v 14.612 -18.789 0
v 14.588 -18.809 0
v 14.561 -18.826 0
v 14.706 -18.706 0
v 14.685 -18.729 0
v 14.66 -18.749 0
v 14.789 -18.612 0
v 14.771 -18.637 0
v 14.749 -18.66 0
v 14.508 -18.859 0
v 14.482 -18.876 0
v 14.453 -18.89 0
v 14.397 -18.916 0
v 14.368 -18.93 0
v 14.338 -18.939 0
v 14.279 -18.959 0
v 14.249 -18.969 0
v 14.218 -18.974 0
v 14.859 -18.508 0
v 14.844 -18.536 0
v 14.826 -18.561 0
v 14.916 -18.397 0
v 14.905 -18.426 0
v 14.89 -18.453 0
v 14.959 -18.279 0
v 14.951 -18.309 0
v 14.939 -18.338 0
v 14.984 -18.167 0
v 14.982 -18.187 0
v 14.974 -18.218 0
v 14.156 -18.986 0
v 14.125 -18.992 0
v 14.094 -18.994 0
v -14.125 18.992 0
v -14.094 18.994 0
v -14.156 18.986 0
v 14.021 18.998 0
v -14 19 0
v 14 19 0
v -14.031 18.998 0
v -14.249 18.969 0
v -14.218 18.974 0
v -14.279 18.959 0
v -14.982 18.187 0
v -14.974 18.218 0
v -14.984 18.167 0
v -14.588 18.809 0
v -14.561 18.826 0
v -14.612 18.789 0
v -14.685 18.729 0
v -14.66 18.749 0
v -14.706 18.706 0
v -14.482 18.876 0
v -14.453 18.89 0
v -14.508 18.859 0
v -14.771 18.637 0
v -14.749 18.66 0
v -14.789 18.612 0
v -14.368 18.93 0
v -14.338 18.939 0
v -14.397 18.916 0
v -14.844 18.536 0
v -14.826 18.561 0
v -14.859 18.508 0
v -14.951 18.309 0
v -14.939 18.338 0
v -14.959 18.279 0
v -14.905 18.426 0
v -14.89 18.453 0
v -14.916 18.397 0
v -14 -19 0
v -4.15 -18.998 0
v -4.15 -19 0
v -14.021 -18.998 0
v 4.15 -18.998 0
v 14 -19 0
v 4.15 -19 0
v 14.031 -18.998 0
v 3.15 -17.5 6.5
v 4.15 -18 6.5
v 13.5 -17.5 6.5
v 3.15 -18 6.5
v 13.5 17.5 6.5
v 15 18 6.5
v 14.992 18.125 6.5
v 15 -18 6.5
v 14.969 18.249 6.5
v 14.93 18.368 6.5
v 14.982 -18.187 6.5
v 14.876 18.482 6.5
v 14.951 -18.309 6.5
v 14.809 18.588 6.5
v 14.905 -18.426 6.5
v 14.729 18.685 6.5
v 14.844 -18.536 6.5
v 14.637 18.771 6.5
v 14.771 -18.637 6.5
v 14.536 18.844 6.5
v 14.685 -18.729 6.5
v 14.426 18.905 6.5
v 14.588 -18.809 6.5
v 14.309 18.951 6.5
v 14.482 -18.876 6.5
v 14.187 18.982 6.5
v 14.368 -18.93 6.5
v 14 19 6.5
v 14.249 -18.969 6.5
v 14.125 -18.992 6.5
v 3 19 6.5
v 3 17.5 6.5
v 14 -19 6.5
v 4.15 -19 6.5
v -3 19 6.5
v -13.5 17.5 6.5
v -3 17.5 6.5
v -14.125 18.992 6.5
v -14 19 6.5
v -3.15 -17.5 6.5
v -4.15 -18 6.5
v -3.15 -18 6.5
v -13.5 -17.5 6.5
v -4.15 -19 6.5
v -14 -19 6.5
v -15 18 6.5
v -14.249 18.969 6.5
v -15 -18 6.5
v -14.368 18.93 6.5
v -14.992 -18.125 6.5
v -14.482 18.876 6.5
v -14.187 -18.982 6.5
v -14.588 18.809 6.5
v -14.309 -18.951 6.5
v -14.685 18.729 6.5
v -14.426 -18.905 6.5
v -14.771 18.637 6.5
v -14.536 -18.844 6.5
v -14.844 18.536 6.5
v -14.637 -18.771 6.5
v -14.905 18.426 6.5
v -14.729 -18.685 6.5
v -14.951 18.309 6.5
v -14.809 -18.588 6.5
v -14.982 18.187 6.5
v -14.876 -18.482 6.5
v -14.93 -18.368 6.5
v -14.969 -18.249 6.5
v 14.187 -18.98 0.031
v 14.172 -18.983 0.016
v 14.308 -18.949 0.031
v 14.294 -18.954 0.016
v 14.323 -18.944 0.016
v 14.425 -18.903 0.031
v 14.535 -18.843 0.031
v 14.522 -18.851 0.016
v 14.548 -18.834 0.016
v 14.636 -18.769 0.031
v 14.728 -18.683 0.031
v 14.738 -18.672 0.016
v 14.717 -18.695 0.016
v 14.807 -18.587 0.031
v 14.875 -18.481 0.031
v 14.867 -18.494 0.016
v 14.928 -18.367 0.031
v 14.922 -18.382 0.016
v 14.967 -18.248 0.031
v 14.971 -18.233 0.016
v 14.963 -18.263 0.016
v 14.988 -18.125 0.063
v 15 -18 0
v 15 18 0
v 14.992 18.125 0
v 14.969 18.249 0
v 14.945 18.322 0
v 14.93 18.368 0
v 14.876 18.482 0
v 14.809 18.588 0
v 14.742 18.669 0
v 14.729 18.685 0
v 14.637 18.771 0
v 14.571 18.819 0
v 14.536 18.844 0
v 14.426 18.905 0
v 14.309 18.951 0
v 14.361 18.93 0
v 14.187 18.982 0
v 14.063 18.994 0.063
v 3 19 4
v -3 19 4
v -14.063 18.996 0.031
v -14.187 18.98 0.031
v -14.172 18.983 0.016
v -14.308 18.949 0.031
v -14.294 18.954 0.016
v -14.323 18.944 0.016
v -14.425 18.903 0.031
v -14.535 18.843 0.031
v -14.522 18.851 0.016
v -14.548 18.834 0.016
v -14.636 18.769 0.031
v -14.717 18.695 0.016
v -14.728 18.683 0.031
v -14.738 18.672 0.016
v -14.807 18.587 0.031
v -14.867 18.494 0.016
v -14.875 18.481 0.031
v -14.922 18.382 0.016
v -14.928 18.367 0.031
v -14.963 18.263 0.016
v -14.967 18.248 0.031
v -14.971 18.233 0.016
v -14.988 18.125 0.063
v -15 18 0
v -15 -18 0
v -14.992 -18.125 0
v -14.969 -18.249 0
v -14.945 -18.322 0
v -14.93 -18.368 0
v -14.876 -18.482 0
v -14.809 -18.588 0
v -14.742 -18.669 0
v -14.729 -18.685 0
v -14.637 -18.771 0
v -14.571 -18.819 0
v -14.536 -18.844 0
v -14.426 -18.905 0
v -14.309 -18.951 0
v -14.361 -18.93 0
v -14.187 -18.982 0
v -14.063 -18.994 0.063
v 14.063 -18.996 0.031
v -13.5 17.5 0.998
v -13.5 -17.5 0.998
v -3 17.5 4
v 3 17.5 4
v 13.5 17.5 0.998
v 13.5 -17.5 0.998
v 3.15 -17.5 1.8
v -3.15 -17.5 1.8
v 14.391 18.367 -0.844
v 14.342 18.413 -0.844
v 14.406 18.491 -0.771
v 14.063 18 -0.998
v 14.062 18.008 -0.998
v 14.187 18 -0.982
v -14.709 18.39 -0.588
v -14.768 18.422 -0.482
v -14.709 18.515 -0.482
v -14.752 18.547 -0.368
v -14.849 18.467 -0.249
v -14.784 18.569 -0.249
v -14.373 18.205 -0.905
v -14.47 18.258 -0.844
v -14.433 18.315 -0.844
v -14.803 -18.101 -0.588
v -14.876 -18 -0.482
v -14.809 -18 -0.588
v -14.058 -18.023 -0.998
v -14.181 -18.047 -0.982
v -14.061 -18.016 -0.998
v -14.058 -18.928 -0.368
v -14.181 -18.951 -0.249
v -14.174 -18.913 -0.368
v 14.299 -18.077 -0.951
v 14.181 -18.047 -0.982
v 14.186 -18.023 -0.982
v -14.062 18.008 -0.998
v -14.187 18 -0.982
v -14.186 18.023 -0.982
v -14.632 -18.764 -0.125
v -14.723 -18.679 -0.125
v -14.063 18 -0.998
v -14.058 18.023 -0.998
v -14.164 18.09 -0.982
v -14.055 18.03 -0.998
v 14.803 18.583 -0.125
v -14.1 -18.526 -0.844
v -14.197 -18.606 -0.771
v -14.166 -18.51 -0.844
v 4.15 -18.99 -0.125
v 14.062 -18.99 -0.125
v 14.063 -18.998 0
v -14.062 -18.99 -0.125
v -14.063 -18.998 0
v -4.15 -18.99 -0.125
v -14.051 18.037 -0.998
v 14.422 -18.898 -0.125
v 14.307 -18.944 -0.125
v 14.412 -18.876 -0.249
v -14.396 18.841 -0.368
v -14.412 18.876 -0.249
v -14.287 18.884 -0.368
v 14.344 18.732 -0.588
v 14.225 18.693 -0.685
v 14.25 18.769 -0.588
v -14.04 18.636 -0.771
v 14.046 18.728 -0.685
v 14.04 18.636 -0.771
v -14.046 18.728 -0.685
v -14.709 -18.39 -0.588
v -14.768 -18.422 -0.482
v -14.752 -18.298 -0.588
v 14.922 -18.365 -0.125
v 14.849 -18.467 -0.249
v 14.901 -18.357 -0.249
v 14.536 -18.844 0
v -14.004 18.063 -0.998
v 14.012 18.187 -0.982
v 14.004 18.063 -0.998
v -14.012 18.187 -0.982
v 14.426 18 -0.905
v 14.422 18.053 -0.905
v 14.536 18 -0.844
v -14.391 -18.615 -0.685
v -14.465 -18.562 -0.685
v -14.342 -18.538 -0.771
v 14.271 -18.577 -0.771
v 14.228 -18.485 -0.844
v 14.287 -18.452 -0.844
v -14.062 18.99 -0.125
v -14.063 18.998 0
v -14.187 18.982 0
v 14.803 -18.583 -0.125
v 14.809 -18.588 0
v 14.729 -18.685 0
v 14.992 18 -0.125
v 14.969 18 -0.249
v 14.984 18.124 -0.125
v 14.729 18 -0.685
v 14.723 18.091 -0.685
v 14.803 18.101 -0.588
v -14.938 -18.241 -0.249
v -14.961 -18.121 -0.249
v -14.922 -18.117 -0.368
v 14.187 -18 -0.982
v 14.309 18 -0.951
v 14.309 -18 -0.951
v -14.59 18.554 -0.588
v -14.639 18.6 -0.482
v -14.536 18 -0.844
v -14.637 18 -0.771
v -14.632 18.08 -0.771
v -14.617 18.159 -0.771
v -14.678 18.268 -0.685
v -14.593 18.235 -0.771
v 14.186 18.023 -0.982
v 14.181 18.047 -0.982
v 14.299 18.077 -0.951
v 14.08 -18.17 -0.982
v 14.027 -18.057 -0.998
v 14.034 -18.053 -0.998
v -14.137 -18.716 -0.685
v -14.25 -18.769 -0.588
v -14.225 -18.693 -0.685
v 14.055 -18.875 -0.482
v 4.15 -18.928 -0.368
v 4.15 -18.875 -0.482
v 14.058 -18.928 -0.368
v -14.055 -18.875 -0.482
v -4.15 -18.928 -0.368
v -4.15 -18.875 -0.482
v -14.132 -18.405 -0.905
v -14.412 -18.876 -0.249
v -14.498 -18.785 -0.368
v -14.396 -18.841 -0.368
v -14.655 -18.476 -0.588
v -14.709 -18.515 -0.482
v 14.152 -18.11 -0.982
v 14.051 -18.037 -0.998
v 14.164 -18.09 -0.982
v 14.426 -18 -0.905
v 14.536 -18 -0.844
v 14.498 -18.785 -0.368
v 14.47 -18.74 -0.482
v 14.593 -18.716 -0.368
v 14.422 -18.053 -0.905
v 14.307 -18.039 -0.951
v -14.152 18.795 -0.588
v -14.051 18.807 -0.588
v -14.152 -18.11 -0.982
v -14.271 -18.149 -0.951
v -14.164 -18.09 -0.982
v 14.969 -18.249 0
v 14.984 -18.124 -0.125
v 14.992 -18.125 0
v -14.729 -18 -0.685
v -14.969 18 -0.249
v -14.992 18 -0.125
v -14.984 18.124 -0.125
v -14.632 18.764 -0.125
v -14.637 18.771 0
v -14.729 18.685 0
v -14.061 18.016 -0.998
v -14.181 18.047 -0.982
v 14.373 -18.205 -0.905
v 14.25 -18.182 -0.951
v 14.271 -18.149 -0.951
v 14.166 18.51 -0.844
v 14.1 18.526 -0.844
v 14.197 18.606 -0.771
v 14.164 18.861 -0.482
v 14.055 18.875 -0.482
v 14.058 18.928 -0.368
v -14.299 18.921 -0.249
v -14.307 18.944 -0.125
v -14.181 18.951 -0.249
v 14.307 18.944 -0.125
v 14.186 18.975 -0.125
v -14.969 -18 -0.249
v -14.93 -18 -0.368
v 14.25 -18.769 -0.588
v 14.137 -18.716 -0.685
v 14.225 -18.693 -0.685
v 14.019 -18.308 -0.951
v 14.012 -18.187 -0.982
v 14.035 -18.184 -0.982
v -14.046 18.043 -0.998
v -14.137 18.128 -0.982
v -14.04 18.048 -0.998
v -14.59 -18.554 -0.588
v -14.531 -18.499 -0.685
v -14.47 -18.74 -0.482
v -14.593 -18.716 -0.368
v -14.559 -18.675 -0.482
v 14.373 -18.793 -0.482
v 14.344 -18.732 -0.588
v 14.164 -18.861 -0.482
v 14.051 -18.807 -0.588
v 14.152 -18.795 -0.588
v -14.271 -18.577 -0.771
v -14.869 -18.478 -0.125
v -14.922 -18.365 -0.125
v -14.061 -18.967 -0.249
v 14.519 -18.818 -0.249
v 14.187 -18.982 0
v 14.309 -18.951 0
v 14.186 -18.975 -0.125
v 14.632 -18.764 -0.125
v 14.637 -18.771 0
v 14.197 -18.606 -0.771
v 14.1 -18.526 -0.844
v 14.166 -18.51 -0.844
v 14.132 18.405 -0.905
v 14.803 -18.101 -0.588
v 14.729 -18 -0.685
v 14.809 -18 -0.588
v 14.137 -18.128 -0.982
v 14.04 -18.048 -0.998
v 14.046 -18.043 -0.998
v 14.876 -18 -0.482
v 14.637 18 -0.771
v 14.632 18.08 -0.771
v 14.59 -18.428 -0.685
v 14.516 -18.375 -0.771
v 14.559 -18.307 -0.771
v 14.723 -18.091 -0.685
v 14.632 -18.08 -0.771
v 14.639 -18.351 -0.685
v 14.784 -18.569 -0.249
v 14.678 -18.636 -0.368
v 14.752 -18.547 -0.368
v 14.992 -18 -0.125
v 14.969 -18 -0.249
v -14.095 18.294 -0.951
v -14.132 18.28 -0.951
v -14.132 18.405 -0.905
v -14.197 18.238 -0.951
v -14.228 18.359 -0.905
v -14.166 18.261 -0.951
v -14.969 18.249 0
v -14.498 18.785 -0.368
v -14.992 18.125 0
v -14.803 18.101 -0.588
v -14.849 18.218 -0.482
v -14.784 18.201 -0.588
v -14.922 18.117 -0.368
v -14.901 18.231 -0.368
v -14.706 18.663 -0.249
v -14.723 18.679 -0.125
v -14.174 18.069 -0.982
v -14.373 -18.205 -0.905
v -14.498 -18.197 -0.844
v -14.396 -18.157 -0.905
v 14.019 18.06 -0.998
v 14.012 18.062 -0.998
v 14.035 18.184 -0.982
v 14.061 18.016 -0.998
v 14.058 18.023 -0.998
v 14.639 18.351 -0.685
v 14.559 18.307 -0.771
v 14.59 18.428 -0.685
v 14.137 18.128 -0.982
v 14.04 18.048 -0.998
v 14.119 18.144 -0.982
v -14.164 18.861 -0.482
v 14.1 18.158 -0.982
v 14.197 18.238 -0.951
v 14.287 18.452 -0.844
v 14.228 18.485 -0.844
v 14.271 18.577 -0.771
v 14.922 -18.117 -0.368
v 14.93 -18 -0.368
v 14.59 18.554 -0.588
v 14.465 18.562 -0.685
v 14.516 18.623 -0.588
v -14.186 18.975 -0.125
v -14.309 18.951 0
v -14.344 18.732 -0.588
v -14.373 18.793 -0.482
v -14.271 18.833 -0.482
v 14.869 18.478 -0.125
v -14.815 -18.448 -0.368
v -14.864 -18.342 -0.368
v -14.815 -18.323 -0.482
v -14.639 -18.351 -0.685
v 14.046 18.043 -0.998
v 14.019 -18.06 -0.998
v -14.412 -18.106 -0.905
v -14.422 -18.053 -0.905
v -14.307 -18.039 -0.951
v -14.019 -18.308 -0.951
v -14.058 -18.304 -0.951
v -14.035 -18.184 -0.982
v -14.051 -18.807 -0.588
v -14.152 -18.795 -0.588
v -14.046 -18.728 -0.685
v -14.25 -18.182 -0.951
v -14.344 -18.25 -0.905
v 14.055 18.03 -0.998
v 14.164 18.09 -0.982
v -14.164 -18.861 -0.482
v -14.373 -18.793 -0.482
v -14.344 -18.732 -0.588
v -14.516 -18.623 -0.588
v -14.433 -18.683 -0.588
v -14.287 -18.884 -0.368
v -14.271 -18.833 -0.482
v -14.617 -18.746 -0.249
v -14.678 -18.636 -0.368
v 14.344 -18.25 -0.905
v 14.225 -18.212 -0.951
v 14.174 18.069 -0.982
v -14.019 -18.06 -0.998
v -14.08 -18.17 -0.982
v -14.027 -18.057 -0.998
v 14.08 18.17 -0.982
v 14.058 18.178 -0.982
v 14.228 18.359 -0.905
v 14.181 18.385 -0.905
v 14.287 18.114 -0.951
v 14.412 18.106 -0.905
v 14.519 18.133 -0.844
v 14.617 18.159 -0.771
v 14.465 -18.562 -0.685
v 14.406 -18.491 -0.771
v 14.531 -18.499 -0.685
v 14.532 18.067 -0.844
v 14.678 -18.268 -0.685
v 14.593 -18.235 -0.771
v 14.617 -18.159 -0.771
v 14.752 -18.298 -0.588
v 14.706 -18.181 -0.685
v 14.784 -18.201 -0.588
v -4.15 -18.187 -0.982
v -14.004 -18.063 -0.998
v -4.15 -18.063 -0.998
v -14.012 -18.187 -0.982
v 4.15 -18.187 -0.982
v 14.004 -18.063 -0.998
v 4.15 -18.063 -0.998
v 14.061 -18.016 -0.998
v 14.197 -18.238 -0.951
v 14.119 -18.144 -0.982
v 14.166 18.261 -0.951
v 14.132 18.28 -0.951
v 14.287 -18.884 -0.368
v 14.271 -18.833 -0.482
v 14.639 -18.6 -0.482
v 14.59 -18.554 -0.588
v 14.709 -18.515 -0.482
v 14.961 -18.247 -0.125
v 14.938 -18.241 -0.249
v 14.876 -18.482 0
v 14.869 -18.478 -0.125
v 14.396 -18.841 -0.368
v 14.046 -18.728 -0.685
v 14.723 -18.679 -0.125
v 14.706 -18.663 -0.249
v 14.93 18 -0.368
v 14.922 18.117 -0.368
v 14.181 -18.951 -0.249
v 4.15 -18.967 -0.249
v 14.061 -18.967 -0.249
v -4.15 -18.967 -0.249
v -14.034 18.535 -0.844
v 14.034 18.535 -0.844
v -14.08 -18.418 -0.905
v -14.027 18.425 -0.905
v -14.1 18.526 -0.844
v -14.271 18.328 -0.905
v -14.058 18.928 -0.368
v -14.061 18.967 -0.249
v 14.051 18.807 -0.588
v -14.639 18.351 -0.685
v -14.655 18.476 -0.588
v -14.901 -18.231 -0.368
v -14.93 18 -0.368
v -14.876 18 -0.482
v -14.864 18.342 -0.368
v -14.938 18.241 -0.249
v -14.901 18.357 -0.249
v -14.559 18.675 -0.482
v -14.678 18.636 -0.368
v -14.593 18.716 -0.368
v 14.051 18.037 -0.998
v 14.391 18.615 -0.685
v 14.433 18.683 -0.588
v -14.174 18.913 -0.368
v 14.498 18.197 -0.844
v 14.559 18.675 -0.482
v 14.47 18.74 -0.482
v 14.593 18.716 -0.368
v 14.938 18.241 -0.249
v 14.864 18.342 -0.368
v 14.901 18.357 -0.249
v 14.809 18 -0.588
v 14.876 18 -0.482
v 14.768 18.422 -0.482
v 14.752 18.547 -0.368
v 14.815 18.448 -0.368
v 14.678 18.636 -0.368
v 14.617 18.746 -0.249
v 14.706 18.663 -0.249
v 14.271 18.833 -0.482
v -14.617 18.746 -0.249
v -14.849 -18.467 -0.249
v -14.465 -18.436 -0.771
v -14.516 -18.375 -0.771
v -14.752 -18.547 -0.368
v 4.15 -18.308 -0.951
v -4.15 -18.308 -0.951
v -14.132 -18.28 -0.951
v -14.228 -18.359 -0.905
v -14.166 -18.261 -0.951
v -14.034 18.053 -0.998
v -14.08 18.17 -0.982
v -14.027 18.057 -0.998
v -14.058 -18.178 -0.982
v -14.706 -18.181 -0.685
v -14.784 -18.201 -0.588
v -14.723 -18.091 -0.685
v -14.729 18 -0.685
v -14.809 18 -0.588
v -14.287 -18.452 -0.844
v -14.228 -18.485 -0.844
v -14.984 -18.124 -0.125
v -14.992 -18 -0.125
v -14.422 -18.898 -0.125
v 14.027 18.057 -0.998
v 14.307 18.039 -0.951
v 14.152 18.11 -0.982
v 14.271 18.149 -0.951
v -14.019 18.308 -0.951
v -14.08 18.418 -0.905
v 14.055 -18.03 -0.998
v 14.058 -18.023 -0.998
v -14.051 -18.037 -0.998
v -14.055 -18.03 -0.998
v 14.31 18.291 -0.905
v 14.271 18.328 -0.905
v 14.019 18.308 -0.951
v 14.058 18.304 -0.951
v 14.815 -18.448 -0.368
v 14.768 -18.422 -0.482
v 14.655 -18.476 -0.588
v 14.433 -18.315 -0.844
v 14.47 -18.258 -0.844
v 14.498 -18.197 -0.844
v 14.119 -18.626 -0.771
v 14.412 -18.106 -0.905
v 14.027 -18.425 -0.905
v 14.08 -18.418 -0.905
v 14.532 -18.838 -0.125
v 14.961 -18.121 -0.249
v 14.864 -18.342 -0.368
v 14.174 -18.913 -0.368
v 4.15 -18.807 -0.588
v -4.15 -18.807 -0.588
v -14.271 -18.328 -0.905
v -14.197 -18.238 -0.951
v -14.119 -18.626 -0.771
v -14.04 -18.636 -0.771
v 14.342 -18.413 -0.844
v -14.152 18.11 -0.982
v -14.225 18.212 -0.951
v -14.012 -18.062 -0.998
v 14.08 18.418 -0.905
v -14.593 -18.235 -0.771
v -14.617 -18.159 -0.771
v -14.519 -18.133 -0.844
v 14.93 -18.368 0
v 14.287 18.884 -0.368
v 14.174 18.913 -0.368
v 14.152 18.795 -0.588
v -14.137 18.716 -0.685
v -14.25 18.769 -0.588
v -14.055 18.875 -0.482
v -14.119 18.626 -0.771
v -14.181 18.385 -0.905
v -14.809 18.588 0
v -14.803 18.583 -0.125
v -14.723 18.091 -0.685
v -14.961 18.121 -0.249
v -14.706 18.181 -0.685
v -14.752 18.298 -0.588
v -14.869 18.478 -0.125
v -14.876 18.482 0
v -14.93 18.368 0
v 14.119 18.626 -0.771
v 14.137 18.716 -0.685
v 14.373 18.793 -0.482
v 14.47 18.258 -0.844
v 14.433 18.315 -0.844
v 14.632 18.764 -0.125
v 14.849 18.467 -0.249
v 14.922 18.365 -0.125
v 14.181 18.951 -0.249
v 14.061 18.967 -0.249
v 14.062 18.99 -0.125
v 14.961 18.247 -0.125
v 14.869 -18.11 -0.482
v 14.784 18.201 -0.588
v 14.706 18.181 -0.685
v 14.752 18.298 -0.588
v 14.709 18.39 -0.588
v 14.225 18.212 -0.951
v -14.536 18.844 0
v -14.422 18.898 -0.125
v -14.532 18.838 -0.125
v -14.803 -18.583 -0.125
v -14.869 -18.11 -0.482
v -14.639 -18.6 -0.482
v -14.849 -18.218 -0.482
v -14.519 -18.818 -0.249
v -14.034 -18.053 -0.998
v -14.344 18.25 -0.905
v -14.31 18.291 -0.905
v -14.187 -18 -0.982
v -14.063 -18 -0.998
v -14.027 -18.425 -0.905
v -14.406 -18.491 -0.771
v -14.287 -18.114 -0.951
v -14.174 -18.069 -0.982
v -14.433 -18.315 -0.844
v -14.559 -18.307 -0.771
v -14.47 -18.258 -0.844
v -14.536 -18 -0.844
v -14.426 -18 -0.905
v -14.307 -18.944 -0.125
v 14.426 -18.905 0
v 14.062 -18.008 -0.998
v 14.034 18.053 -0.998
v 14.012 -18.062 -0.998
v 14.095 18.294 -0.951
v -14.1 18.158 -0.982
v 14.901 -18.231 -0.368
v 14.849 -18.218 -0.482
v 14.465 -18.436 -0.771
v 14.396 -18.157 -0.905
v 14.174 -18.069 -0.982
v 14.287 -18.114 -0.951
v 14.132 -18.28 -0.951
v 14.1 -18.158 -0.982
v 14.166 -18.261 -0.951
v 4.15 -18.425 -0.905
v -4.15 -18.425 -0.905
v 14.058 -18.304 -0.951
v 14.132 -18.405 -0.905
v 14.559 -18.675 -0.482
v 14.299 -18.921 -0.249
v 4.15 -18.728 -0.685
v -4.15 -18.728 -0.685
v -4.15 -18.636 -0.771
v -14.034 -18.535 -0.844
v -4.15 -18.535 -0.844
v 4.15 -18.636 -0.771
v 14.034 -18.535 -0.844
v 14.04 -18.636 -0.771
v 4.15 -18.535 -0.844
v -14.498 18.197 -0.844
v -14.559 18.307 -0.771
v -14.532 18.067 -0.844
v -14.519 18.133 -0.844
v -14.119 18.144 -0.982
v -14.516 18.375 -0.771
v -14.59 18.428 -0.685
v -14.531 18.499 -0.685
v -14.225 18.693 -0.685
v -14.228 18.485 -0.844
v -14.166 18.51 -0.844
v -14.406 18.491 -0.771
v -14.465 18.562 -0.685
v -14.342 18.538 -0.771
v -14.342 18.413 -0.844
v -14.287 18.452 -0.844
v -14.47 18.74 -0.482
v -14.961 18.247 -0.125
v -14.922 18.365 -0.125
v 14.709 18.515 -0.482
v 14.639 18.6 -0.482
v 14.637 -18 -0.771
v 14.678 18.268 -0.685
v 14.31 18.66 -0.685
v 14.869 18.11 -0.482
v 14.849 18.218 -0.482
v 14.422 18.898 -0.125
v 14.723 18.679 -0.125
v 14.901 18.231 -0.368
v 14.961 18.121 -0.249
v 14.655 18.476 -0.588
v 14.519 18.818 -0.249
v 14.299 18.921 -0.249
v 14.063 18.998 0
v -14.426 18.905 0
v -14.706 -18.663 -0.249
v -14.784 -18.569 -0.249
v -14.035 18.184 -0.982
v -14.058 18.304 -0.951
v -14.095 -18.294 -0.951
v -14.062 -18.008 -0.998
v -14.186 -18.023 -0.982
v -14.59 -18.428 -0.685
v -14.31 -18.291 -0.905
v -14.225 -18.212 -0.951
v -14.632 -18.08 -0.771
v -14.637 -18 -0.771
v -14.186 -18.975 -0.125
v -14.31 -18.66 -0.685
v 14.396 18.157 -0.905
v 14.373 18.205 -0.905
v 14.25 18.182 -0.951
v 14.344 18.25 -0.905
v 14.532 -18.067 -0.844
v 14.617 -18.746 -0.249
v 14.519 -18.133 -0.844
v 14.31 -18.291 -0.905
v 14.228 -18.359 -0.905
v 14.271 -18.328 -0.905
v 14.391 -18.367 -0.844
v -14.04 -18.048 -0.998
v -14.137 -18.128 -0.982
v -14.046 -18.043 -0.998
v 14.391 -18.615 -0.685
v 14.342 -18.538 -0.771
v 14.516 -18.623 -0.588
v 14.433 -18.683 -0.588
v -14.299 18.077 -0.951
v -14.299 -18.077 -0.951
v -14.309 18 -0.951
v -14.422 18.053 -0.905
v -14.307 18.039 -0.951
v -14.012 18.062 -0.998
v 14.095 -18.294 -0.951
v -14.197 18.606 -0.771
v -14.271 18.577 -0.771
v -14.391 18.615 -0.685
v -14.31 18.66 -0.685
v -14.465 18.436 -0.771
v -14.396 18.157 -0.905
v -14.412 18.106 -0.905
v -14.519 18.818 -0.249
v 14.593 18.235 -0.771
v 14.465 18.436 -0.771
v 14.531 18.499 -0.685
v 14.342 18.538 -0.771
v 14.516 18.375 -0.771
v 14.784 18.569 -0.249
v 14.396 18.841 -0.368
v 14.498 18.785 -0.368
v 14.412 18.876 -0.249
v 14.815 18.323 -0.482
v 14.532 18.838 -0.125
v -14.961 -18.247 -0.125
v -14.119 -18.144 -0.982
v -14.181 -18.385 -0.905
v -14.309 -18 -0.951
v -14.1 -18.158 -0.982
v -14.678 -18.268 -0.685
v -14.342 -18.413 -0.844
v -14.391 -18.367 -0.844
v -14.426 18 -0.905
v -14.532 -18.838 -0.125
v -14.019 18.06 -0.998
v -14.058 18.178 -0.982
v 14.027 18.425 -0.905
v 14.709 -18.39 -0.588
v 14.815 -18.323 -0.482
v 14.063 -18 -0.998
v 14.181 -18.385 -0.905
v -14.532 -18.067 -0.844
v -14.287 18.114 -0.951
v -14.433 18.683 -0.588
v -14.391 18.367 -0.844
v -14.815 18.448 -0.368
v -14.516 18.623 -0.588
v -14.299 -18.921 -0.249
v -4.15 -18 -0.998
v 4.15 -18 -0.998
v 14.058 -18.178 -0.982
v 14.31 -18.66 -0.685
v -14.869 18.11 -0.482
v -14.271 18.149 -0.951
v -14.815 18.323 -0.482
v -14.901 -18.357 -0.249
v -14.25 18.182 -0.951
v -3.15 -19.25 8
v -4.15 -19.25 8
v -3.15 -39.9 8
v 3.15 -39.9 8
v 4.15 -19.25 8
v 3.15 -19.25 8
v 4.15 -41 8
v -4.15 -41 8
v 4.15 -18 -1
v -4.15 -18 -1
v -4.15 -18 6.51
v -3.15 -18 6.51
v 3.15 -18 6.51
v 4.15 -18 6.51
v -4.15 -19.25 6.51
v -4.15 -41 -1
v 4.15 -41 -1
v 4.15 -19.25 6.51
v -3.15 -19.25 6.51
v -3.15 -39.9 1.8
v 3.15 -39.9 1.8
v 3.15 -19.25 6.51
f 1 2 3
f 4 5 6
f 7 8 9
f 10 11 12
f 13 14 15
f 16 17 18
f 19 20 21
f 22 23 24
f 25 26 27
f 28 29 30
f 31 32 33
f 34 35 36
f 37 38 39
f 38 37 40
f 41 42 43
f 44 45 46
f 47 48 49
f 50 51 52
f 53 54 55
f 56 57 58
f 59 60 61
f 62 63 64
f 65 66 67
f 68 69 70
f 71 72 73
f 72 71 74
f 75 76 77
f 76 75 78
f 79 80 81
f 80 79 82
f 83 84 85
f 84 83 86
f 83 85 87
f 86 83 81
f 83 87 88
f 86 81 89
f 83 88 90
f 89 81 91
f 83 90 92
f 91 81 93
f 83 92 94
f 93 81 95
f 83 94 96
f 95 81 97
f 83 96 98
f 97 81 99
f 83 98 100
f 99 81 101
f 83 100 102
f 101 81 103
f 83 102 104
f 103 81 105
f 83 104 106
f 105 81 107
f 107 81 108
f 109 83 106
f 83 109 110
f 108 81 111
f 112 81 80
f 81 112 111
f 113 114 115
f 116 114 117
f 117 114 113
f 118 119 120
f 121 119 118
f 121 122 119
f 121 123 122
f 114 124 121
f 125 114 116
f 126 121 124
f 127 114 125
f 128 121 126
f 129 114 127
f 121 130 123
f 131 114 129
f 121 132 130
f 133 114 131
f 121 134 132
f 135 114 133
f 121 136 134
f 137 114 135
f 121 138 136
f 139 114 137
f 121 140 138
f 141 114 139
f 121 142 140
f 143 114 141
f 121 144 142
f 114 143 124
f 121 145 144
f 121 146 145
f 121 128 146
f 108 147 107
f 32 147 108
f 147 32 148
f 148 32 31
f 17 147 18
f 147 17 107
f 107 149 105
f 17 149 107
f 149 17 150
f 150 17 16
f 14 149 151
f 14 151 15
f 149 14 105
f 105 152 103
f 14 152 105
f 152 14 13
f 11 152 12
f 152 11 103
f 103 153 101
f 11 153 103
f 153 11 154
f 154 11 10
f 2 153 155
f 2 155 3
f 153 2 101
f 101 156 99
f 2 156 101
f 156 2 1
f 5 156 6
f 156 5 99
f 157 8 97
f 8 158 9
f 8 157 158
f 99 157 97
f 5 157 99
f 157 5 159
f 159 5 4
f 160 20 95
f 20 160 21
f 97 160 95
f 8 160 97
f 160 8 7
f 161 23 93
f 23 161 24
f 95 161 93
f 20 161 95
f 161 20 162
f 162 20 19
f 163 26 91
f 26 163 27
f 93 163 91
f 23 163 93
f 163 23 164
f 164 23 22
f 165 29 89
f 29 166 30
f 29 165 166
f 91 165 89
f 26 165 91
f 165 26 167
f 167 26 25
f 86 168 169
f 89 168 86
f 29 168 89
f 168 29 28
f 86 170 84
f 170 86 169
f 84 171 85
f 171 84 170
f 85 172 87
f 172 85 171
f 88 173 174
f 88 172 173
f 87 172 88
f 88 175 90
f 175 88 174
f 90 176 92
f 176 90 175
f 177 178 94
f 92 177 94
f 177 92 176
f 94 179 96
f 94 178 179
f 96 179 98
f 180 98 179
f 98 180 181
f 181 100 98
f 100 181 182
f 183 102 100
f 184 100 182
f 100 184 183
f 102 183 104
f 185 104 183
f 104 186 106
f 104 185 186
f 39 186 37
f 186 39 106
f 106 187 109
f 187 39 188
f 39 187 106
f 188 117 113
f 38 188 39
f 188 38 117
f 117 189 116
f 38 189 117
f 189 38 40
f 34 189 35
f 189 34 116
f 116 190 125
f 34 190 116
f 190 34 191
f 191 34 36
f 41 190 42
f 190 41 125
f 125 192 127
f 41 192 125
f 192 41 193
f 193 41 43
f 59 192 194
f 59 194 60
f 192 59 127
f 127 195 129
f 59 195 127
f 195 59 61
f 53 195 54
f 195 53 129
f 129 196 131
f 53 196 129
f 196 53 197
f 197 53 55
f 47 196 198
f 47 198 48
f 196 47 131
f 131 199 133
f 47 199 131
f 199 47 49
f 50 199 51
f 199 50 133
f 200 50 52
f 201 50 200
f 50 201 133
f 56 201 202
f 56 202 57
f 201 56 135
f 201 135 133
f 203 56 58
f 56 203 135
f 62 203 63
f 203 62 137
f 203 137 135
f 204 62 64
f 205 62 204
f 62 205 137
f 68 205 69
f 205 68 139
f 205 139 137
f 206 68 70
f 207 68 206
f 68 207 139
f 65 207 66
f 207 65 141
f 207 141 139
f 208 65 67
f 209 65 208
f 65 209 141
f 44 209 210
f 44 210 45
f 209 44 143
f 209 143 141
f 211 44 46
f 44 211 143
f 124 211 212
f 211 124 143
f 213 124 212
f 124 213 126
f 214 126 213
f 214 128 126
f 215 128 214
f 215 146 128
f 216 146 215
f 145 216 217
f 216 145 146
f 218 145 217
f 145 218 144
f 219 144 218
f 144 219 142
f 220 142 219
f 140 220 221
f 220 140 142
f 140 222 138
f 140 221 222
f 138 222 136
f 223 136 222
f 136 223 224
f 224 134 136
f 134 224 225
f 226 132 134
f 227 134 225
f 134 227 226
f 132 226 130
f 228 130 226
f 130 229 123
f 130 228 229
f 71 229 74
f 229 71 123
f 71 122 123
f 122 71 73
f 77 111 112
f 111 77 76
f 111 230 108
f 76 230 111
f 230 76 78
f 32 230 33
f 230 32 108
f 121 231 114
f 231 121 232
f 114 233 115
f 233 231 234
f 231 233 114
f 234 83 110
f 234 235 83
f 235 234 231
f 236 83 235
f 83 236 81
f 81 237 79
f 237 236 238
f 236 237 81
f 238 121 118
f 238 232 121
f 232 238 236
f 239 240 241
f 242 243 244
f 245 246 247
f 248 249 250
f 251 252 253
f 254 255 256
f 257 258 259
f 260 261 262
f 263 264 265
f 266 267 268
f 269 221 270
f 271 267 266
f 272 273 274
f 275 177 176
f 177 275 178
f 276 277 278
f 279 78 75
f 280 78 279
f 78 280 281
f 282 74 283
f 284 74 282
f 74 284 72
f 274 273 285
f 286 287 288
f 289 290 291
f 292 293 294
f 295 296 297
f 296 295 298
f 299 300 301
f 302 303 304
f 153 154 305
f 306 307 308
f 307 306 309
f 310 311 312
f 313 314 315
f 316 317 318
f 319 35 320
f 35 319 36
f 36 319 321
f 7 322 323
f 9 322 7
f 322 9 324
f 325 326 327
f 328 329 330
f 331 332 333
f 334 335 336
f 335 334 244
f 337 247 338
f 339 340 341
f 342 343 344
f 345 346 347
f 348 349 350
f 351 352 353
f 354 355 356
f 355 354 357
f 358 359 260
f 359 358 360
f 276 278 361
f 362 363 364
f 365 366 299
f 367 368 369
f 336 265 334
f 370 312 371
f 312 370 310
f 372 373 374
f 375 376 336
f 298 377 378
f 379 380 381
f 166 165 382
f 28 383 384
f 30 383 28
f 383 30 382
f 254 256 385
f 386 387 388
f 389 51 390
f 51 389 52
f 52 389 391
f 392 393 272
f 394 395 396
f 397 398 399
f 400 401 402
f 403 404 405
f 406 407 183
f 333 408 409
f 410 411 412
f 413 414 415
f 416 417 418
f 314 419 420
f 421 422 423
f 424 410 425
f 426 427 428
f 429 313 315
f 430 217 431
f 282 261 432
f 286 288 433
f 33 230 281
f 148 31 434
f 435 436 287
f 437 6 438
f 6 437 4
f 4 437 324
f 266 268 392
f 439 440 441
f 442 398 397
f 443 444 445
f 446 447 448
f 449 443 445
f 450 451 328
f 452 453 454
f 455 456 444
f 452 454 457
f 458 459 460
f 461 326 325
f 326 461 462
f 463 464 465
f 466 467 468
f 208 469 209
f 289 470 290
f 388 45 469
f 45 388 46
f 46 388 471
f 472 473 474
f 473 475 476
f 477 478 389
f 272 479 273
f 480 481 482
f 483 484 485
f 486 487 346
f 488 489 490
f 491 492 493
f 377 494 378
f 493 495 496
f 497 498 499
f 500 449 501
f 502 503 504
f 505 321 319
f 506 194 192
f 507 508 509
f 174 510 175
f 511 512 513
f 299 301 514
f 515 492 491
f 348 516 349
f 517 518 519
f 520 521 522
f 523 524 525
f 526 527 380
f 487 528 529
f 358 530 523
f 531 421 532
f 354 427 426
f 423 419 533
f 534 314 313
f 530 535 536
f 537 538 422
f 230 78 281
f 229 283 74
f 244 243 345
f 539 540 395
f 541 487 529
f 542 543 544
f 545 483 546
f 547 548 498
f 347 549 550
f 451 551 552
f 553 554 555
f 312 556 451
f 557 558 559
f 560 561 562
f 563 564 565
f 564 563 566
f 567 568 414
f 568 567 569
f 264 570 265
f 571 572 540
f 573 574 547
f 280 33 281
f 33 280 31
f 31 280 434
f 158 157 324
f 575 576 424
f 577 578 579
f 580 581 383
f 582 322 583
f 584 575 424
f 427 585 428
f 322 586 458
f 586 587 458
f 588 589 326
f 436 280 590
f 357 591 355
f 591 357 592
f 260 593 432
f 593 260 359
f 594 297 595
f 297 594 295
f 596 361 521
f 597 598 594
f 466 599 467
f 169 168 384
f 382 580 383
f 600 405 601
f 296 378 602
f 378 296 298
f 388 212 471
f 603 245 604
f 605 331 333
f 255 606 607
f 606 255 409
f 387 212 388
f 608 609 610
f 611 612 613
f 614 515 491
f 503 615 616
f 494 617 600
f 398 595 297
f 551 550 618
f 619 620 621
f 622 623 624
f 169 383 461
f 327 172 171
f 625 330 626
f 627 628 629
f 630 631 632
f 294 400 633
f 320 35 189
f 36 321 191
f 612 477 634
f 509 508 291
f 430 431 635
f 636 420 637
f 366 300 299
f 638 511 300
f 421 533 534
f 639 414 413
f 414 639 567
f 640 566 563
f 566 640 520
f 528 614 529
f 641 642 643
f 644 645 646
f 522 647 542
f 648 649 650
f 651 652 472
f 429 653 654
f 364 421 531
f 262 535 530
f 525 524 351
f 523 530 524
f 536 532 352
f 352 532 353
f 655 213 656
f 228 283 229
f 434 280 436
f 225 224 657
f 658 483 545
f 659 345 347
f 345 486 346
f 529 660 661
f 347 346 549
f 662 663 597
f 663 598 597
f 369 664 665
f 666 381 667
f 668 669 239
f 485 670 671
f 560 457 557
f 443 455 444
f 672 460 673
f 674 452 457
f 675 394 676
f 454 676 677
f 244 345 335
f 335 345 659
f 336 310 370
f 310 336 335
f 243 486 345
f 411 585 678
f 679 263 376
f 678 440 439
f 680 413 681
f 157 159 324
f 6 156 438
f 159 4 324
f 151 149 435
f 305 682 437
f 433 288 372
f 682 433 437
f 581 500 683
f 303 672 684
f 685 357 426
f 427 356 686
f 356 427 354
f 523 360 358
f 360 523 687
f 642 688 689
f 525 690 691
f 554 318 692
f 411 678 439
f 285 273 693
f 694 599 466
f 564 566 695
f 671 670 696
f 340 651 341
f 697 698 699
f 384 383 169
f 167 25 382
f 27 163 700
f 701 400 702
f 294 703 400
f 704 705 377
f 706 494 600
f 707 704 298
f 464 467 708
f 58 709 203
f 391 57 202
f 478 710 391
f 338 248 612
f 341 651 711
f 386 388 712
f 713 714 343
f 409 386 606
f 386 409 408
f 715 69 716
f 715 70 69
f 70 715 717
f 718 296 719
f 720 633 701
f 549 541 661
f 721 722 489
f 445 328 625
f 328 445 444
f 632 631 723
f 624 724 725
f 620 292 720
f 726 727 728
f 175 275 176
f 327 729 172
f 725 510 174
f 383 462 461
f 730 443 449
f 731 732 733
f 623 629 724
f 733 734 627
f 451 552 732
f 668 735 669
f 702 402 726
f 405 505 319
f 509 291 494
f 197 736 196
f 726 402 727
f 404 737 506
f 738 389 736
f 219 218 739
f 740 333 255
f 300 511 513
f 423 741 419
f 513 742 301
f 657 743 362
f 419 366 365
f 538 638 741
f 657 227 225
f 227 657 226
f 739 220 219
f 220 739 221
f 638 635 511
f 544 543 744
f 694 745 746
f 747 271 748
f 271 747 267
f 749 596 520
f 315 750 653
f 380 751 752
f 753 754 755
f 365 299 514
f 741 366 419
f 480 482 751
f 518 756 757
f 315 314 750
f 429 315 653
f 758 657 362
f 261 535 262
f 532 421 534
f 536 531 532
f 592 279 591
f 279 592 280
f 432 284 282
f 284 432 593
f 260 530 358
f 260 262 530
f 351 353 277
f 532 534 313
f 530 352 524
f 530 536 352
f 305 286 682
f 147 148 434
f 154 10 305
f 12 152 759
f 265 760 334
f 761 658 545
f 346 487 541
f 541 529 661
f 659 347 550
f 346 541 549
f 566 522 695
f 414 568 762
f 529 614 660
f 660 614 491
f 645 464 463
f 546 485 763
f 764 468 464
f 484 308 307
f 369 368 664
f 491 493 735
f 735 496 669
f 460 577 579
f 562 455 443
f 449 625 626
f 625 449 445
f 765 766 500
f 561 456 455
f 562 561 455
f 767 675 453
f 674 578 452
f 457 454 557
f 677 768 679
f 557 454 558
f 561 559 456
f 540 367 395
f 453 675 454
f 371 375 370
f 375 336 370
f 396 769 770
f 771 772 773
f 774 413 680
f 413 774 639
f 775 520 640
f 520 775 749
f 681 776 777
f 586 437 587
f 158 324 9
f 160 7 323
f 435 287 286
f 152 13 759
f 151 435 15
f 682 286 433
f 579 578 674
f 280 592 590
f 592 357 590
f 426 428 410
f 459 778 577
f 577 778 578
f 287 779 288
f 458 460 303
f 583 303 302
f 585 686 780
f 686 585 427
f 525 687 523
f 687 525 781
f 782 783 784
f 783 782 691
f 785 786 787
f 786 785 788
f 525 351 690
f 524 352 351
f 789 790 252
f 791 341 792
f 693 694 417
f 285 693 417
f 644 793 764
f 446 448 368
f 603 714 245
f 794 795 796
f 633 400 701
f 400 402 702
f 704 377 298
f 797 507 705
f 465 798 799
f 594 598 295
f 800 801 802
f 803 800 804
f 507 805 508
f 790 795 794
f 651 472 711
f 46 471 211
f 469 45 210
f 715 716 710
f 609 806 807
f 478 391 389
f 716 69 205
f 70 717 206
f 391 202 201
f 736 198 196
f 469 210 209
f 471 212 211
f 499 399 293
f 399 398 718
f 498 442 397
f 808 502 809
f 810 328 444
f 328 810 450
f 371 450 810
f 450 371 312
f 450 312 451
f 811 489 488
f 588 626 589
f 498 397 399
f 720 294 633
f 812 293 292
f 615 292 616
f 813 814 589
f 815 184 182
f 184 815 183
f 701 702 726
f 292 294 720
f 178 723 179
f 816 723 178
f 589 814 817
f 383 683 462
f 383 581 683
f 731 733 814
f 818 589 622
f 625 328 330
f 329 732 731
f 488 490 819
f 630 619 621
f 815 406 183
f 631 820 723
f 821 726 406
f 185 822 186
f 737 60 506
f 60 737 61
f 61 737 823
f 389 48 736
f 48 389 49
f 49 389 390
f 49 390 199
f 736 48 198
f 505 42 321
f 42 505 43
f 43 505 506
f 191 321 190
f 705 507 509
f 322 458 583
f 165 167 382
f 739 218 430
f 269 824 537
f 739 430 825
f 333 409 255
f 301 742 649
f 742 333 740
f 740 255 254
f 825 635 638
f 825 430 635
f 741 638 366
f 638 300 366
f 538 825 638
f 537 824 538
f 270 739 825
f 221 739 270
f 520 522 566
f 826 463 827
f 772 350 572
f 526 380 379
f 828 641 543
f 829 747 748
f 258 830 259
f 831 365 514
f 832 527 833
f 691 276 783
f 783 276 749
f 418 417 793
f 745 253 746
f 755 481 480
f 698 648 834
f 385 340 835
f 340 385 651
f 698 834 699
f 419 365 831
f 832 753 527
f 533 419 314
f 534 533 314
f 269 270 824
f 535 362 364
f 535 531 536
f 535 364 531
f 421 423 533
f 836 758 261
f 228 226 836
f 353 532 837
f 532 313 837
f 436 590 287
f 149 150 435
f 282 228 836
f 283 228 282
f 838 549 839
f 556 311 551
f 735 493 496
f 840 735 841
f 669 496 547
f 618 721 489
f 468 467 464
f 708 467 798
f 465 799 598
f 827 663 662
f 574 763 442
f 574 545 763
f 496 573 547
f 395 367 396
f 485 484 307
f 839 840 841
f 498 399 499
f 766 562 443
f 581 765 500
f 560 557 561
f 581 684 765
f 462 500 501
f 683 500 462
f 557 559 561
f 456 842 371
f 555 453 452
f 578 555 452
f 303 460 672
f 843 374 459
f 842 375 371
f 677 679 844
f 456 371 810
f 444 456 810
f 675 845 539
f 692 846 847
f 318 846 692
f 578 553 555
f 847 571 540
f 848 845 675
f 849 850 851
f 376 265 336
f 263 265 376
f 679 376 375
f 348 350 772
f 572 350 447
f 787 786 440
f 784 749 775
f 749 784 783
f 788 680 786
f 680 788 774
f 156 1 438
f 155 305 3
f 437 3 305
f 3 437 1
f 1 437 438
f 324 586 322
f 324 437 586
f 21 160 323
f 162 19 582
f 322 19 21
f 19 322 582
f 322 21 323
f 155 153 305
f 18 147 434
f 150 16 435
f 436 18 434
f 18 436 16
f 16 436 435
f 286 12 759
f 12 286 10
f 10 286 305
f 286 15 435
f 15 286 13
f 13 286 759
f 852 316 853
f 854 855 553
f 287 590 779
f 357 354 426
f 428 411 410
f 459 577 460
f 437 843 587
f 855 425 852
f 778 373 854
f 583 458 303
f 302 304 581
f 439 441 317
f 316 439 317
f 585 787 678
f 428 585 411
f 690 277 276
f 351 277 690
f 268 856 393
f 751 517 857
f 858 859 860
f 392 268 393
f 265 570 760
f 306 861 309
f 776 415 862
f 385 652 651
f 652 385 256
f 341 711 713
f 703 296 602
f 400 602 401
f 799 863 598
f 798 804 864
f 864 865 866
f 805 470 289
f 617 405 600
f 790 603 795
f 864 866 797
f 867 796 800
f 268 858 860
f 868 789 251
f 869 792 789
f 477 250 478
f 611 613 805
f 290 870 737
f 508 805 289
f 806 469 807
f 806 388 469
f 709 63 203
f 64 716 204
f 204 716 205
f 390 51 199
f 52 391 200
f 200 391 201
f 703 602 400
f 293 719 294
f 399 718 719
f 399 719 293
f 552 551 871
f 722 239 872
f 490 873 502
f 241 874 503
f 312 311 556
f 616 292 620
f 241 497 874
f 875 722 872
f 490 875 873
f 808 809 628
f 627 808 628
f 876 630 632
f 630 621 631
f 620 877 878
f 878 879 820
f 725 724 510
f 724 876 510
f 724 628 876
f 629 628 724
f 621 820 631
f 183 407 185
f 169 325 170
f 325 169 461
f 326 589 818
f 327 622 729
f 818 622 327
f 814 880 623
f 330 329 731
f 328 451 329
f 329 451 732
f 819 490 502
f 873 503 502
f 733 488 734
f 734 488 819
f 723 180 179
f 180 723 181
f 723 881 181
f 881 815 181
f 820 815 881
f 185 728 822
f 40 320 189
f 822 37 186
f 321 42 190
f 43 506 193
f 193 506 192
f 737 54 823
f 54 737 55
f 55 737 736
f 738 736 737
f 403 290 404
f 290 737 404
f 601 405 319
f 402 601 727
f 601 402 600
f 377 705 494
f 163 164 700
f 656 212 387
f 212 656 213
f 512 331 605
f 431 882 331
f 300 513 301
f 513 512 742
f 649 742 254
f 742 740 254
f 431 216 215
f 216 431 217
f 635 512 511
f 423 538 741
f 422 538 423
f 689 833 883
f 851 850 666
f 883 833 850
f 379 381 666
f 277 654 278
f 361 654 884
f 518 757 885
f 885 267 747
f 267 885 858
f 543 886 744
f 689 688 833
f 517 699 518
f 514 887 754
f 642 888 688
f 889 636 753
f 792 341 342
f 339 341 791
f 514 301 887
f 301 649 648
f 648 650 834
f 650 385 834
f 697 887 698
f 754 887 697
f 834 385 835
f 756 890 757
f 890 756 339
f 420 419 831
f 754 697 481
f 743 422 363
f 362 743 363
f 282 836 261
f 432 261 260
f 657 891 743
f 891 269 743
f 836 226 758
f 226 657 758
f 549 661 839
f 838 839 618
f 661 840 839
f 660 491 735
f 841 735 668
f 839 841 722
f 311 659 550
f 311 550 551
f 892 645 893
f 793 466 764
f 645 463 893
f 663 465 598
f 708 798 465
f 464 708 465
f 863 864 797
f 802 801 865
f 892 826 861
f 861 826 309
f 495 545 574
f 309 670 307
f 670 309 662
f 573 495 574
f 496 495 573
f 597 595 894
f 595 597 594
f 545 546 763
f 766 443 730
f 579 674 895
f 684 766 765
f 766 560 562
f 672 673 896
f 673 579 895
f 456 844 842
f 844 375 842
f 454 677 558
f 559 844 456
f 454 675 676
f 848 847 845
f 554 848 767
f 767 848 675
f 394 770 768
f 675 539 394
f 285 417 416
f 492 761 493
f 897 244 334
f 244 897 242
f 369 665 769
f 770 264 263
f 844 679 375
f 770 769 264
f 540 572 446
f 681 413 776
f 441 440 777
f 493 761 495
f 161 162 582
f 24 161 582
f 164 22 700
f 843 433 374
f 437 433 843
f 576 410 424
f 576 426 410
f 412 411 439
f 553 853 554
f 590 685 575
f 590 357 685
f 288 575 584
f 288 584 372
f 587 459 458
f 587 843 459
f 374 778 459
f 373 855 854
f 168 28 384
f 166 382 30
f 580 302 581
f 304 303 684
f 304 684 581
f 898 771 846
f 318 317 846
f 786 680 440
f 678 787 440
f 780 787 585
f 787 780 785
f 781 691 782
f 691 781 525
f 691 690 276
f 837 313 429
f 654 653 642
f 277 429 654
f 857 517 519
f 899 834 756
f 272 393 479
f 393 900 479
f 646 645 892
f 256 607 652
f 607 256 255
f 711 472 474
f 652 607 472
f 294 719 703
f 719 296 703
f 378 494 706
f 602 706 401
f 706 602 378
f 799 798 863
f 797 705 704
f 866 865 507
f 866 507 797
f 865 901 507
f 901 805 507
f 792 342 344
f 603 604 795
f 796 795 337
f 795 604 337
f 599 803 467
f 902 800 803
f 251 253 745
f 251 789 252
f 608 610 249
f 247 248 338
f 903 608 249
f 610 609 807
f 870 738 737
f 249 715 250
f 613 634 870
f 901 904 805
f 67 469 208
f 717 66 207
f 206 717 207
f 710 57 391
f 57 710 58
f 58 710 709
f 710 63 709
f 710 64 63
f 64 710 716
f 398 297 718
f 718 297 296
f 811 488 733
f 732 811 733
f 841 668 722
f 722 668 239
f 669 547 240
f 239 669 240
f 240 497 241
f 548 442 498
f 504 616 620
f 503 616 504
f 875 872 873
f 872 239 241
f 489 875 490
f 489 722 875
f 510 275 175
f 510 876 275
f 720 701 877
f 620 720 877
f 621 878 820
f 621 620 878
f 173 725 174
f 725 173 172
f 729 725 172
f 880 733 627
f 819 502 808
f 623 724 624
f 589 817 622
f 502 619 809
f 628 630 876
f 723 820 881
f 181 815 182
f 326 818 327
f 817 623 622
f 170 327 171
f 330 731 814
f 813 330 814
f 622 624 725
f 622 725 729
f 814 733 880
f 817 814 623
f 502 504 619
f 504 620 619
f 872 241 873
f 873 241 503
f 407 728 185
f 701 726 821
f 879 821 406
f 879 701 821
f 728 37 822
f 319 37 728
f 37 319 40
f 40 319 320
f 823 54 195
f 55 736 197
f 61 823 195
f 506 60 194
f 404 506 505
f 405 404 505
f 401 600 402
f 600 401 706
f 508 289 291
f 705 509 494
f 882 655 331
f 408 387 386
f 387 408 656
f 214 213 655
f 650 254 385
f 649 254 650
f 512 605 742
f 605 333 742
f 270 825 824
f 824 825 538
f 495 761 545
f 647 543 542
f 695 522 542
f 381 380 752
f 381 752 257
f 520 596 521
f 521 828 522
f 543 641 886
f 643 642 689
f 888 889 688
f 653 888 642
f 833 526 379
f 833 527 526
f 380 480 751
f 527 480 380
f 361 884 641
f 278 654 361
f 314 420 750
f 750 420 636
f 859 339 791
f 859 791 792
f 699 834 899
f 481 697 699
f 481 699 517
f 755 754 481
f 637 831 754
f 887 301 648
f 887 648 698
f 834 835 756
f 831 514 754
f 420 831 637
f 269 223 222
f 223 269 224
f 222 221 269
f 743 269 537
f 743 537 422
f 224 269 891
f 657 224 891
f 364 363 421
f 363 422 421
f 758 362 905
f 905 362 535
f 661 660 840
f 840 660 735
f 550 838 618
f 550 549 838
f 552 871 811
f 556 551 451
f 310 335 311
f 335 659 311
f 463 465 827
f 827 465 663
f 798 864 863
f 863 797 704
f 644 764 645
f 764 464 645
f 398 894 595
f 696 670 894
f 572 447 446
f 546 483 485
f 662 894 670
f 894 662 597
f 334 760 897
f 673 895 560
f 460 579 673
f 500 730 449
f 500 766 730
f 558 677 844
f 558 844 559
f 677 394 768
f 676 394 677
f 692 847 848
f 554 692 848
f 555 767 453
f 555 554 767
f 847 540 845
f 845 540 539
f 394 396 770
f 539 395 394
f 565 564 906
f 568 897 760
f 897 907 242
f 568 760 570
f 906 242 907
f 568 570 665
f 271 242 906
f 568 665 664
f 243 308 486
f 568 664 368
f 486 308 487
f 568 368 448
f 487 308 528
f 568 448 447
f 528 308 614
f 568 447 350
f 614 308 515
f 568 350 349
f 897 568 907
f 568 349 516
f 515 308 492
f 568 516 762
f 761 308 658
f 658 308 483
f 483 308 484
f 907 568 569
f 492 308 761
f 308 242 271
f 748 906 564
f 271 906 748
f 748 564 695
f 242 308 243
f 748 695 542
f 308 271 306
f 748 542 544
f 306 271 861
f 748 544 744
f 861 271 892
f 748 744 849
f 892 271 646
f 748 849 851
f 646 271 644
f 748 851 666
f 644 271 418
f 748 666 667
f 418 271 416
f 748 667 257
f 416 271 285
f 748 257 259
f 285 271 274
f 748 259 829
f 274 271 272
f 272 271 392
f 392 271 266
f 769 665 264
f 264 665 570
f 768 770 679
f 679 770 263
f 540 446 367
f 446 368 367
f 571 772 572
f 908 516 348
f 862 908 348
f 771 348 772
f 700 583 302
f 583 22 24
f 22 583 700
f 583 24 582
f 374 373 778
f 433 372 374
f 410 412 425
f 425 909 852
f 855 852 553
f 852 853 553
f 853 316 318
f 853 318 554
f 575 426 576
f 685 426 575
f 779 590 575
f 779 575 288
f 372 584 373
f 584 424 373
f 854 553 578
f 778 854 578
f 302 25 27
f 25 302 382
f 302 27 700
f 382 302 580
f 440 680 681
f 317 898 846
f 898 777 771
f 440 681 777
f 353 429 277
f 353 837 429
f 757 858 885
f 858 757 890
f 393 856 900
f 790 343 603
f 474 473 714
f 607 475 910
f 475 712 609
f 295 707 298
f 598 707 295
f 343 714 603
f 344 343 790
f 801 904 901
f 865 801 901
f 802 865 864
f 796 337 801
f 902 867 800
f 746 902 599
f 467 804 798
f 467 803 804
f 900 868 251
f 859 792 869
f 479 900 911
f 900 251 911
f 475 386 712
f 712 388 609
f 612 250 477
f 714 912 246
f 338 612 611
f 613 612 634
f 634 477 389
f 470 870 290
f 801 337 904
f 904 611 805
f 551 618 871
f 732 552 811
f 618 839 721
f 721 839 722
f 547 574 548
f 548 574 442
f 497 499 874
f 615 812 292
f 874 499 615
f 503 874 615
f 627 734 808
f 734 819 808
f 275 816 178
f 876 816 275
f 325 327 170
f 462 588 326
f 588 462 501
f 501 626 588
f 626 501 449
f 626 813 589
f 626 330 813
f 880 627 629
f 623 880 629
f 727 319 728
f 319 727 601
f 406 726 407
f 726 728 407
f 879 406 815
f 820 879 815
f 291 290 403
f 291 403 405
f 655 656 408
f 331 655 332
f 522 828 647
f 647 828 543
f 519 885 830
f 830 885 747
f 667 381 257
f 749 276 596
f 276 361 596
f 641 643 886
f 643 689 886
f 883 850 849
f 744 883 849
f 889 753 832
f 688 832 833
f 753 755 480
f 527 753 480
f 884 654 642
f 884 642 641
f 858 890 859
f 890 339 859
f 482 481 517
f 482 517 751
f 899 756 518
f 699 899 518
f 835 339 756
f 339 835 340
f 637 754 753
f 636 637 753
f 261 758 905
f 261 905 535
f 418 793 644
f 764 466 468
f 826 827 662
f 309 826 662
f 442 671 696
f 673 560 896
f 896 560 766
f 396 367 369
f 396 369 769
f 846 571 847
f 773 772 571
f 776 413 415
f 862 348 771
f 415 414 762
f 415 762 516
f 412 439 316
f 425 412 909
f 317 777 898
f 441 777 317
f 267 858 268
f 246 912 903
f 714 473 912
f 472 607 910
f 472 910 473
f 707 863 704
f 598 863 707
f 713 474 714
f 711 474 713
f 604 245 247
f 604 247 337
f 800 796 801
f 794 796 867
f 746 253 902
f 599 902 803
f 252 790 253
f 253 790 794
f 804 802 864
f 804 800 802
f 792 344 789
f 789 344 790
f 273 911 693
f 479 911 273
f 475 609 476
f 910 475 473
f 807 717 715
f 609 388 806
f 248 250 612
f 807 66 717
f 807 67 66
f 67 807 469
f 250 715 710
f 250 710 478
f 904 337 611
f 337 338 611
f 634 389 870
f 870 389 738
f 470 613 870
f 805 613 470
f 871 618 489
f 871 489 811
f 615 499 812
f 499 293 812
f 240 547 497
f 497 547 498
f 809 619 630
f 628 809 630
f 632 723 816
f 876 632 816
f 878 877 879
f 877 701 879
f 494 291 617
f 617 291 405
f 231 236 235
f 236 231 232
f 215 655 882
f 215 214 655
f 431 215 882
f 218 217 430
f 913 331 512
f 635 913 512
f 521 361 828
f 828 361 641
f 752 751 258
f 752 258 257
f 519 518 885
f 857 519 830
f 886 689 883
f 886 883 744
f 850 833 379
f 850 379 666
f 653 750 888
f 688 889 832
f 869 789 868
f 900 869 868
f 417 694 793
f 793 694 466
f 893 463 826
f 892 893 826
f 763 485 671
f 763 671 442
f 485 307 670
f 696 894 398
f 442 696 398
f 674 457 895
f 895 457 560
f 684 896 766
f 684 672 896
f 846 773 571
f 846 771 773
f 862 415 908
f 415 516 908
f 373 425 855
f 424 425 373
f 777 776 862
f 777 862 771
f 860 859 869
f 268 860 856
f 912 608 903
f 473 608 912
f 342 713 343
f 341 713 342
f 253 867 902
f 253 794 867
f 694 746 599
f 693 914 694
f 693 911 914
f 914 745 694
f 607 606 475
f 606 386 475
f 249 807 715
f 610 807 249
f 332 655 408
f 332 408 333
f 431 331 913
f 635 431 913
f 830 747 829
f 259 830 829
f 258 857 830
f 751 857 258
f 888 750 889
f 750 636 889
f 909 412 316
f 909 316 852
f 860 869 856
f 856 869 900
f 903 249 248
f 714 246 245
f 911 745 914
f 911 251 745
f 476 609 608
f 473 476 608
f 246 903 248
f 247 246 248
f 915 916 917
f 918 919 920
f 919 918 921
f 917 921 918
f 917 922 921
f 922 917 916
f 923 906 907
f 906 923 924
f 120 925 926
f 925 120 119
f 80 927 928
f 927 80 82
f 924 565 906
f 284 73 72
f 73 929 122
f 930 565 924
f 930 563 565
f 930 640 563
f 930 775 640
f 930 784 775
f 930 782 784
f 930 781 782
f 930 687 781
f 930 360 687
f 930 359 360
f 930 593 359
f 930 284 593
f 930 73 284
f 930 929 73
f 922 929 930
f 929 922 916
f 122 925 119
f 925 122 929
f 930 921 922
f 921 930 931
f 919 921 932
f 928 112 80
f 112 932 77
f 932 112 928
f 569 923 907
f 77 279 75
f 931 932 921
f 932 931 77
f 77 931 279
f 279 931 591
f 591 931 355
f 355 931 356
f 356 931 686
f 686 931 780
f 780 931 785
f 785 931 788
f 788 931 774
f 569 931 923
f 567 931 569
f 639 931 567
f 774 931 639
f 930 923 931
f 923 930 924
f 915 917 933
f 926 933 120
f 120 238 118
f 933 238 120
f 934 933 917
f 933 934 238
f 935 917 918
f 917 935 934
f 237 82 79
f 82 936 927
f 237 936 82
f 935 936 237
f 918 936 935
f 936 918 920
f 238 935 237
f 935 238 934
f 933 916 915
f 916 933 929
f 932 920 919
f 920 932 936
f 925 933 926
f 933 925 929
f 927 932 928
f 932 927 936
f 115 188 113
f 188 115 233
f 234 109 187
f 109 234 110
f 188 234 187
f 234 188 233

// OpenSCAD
$fn=50;
BOX_W = 28; // Box Width
BOX_L = 36;// Box Length
BOX_H = 6.5; // Box Height
CORNER_RADIUS = 1.0; // Radius of corners
WALL = 1.0;// Wall Thickness

MIC_OUTSIDE_WIDTH=8.3;
MIC_OUTSIDE_HEIGHT=9.0;
MIC_INSIDE_WIDTH=6.3;
MIC_LENGTH=23;

CON_OUTSIDE=5;
CON_INSIDE=4;
CON_LENGTH=3;

difference() {
  union() {
  linear_extrude( BOX_H )
    difference(){
      offset(r=CORNER_RADIUS) square( [BOX_W, BOX_L], center=true );
      offset(r= CORNER_RADIUS - WALL) square([BOX_W-WALL, BOX_L-WALL], center=true );
    };

    coordinates = [ [0,0],[0,BOX_L],[BOX_W,BOX_L],[BOX_W,0] ];

    translate ( [-BOX_W/2, -BOX_L/2] )
      hull()
      for (i = coordinates)
        translate(i) sphere(CORNER_RADIUS);

    // outside shape
    translate([0,-18.0,BOX_H-3])
    rotate([90,0,0])
    #linear_extrude(MIC_LENGTH) square([MIC_OUTSIDE_WIDTH,MIC_OUTSIDE_HEIGHT], center=true);

  }

  translate([0,-13.8,BOX_H-0.2]) // inside
  rotate([90,0,0])
  linear_extrude(MIC_LENGTH+3.1) square([MIC_INSIDE_WIDTH,MIC_OUTSIDE_HEIGHT], center=true);  

  // mic lid clearance
  translate([0,-17.25,BOX_H+1.11])
  rotate([90,0,0])
  linear_extrude(2.0) square([9,2.2], center=true);
  
  translate([0,19.3,BOX_H-1])
  rotate([90,0,0])
  //cylinder(h=CON_LENGTH+1,r=CON_INSIDE/2);
  #linear_extrude(2.0) square([6,3], center=true);
}
